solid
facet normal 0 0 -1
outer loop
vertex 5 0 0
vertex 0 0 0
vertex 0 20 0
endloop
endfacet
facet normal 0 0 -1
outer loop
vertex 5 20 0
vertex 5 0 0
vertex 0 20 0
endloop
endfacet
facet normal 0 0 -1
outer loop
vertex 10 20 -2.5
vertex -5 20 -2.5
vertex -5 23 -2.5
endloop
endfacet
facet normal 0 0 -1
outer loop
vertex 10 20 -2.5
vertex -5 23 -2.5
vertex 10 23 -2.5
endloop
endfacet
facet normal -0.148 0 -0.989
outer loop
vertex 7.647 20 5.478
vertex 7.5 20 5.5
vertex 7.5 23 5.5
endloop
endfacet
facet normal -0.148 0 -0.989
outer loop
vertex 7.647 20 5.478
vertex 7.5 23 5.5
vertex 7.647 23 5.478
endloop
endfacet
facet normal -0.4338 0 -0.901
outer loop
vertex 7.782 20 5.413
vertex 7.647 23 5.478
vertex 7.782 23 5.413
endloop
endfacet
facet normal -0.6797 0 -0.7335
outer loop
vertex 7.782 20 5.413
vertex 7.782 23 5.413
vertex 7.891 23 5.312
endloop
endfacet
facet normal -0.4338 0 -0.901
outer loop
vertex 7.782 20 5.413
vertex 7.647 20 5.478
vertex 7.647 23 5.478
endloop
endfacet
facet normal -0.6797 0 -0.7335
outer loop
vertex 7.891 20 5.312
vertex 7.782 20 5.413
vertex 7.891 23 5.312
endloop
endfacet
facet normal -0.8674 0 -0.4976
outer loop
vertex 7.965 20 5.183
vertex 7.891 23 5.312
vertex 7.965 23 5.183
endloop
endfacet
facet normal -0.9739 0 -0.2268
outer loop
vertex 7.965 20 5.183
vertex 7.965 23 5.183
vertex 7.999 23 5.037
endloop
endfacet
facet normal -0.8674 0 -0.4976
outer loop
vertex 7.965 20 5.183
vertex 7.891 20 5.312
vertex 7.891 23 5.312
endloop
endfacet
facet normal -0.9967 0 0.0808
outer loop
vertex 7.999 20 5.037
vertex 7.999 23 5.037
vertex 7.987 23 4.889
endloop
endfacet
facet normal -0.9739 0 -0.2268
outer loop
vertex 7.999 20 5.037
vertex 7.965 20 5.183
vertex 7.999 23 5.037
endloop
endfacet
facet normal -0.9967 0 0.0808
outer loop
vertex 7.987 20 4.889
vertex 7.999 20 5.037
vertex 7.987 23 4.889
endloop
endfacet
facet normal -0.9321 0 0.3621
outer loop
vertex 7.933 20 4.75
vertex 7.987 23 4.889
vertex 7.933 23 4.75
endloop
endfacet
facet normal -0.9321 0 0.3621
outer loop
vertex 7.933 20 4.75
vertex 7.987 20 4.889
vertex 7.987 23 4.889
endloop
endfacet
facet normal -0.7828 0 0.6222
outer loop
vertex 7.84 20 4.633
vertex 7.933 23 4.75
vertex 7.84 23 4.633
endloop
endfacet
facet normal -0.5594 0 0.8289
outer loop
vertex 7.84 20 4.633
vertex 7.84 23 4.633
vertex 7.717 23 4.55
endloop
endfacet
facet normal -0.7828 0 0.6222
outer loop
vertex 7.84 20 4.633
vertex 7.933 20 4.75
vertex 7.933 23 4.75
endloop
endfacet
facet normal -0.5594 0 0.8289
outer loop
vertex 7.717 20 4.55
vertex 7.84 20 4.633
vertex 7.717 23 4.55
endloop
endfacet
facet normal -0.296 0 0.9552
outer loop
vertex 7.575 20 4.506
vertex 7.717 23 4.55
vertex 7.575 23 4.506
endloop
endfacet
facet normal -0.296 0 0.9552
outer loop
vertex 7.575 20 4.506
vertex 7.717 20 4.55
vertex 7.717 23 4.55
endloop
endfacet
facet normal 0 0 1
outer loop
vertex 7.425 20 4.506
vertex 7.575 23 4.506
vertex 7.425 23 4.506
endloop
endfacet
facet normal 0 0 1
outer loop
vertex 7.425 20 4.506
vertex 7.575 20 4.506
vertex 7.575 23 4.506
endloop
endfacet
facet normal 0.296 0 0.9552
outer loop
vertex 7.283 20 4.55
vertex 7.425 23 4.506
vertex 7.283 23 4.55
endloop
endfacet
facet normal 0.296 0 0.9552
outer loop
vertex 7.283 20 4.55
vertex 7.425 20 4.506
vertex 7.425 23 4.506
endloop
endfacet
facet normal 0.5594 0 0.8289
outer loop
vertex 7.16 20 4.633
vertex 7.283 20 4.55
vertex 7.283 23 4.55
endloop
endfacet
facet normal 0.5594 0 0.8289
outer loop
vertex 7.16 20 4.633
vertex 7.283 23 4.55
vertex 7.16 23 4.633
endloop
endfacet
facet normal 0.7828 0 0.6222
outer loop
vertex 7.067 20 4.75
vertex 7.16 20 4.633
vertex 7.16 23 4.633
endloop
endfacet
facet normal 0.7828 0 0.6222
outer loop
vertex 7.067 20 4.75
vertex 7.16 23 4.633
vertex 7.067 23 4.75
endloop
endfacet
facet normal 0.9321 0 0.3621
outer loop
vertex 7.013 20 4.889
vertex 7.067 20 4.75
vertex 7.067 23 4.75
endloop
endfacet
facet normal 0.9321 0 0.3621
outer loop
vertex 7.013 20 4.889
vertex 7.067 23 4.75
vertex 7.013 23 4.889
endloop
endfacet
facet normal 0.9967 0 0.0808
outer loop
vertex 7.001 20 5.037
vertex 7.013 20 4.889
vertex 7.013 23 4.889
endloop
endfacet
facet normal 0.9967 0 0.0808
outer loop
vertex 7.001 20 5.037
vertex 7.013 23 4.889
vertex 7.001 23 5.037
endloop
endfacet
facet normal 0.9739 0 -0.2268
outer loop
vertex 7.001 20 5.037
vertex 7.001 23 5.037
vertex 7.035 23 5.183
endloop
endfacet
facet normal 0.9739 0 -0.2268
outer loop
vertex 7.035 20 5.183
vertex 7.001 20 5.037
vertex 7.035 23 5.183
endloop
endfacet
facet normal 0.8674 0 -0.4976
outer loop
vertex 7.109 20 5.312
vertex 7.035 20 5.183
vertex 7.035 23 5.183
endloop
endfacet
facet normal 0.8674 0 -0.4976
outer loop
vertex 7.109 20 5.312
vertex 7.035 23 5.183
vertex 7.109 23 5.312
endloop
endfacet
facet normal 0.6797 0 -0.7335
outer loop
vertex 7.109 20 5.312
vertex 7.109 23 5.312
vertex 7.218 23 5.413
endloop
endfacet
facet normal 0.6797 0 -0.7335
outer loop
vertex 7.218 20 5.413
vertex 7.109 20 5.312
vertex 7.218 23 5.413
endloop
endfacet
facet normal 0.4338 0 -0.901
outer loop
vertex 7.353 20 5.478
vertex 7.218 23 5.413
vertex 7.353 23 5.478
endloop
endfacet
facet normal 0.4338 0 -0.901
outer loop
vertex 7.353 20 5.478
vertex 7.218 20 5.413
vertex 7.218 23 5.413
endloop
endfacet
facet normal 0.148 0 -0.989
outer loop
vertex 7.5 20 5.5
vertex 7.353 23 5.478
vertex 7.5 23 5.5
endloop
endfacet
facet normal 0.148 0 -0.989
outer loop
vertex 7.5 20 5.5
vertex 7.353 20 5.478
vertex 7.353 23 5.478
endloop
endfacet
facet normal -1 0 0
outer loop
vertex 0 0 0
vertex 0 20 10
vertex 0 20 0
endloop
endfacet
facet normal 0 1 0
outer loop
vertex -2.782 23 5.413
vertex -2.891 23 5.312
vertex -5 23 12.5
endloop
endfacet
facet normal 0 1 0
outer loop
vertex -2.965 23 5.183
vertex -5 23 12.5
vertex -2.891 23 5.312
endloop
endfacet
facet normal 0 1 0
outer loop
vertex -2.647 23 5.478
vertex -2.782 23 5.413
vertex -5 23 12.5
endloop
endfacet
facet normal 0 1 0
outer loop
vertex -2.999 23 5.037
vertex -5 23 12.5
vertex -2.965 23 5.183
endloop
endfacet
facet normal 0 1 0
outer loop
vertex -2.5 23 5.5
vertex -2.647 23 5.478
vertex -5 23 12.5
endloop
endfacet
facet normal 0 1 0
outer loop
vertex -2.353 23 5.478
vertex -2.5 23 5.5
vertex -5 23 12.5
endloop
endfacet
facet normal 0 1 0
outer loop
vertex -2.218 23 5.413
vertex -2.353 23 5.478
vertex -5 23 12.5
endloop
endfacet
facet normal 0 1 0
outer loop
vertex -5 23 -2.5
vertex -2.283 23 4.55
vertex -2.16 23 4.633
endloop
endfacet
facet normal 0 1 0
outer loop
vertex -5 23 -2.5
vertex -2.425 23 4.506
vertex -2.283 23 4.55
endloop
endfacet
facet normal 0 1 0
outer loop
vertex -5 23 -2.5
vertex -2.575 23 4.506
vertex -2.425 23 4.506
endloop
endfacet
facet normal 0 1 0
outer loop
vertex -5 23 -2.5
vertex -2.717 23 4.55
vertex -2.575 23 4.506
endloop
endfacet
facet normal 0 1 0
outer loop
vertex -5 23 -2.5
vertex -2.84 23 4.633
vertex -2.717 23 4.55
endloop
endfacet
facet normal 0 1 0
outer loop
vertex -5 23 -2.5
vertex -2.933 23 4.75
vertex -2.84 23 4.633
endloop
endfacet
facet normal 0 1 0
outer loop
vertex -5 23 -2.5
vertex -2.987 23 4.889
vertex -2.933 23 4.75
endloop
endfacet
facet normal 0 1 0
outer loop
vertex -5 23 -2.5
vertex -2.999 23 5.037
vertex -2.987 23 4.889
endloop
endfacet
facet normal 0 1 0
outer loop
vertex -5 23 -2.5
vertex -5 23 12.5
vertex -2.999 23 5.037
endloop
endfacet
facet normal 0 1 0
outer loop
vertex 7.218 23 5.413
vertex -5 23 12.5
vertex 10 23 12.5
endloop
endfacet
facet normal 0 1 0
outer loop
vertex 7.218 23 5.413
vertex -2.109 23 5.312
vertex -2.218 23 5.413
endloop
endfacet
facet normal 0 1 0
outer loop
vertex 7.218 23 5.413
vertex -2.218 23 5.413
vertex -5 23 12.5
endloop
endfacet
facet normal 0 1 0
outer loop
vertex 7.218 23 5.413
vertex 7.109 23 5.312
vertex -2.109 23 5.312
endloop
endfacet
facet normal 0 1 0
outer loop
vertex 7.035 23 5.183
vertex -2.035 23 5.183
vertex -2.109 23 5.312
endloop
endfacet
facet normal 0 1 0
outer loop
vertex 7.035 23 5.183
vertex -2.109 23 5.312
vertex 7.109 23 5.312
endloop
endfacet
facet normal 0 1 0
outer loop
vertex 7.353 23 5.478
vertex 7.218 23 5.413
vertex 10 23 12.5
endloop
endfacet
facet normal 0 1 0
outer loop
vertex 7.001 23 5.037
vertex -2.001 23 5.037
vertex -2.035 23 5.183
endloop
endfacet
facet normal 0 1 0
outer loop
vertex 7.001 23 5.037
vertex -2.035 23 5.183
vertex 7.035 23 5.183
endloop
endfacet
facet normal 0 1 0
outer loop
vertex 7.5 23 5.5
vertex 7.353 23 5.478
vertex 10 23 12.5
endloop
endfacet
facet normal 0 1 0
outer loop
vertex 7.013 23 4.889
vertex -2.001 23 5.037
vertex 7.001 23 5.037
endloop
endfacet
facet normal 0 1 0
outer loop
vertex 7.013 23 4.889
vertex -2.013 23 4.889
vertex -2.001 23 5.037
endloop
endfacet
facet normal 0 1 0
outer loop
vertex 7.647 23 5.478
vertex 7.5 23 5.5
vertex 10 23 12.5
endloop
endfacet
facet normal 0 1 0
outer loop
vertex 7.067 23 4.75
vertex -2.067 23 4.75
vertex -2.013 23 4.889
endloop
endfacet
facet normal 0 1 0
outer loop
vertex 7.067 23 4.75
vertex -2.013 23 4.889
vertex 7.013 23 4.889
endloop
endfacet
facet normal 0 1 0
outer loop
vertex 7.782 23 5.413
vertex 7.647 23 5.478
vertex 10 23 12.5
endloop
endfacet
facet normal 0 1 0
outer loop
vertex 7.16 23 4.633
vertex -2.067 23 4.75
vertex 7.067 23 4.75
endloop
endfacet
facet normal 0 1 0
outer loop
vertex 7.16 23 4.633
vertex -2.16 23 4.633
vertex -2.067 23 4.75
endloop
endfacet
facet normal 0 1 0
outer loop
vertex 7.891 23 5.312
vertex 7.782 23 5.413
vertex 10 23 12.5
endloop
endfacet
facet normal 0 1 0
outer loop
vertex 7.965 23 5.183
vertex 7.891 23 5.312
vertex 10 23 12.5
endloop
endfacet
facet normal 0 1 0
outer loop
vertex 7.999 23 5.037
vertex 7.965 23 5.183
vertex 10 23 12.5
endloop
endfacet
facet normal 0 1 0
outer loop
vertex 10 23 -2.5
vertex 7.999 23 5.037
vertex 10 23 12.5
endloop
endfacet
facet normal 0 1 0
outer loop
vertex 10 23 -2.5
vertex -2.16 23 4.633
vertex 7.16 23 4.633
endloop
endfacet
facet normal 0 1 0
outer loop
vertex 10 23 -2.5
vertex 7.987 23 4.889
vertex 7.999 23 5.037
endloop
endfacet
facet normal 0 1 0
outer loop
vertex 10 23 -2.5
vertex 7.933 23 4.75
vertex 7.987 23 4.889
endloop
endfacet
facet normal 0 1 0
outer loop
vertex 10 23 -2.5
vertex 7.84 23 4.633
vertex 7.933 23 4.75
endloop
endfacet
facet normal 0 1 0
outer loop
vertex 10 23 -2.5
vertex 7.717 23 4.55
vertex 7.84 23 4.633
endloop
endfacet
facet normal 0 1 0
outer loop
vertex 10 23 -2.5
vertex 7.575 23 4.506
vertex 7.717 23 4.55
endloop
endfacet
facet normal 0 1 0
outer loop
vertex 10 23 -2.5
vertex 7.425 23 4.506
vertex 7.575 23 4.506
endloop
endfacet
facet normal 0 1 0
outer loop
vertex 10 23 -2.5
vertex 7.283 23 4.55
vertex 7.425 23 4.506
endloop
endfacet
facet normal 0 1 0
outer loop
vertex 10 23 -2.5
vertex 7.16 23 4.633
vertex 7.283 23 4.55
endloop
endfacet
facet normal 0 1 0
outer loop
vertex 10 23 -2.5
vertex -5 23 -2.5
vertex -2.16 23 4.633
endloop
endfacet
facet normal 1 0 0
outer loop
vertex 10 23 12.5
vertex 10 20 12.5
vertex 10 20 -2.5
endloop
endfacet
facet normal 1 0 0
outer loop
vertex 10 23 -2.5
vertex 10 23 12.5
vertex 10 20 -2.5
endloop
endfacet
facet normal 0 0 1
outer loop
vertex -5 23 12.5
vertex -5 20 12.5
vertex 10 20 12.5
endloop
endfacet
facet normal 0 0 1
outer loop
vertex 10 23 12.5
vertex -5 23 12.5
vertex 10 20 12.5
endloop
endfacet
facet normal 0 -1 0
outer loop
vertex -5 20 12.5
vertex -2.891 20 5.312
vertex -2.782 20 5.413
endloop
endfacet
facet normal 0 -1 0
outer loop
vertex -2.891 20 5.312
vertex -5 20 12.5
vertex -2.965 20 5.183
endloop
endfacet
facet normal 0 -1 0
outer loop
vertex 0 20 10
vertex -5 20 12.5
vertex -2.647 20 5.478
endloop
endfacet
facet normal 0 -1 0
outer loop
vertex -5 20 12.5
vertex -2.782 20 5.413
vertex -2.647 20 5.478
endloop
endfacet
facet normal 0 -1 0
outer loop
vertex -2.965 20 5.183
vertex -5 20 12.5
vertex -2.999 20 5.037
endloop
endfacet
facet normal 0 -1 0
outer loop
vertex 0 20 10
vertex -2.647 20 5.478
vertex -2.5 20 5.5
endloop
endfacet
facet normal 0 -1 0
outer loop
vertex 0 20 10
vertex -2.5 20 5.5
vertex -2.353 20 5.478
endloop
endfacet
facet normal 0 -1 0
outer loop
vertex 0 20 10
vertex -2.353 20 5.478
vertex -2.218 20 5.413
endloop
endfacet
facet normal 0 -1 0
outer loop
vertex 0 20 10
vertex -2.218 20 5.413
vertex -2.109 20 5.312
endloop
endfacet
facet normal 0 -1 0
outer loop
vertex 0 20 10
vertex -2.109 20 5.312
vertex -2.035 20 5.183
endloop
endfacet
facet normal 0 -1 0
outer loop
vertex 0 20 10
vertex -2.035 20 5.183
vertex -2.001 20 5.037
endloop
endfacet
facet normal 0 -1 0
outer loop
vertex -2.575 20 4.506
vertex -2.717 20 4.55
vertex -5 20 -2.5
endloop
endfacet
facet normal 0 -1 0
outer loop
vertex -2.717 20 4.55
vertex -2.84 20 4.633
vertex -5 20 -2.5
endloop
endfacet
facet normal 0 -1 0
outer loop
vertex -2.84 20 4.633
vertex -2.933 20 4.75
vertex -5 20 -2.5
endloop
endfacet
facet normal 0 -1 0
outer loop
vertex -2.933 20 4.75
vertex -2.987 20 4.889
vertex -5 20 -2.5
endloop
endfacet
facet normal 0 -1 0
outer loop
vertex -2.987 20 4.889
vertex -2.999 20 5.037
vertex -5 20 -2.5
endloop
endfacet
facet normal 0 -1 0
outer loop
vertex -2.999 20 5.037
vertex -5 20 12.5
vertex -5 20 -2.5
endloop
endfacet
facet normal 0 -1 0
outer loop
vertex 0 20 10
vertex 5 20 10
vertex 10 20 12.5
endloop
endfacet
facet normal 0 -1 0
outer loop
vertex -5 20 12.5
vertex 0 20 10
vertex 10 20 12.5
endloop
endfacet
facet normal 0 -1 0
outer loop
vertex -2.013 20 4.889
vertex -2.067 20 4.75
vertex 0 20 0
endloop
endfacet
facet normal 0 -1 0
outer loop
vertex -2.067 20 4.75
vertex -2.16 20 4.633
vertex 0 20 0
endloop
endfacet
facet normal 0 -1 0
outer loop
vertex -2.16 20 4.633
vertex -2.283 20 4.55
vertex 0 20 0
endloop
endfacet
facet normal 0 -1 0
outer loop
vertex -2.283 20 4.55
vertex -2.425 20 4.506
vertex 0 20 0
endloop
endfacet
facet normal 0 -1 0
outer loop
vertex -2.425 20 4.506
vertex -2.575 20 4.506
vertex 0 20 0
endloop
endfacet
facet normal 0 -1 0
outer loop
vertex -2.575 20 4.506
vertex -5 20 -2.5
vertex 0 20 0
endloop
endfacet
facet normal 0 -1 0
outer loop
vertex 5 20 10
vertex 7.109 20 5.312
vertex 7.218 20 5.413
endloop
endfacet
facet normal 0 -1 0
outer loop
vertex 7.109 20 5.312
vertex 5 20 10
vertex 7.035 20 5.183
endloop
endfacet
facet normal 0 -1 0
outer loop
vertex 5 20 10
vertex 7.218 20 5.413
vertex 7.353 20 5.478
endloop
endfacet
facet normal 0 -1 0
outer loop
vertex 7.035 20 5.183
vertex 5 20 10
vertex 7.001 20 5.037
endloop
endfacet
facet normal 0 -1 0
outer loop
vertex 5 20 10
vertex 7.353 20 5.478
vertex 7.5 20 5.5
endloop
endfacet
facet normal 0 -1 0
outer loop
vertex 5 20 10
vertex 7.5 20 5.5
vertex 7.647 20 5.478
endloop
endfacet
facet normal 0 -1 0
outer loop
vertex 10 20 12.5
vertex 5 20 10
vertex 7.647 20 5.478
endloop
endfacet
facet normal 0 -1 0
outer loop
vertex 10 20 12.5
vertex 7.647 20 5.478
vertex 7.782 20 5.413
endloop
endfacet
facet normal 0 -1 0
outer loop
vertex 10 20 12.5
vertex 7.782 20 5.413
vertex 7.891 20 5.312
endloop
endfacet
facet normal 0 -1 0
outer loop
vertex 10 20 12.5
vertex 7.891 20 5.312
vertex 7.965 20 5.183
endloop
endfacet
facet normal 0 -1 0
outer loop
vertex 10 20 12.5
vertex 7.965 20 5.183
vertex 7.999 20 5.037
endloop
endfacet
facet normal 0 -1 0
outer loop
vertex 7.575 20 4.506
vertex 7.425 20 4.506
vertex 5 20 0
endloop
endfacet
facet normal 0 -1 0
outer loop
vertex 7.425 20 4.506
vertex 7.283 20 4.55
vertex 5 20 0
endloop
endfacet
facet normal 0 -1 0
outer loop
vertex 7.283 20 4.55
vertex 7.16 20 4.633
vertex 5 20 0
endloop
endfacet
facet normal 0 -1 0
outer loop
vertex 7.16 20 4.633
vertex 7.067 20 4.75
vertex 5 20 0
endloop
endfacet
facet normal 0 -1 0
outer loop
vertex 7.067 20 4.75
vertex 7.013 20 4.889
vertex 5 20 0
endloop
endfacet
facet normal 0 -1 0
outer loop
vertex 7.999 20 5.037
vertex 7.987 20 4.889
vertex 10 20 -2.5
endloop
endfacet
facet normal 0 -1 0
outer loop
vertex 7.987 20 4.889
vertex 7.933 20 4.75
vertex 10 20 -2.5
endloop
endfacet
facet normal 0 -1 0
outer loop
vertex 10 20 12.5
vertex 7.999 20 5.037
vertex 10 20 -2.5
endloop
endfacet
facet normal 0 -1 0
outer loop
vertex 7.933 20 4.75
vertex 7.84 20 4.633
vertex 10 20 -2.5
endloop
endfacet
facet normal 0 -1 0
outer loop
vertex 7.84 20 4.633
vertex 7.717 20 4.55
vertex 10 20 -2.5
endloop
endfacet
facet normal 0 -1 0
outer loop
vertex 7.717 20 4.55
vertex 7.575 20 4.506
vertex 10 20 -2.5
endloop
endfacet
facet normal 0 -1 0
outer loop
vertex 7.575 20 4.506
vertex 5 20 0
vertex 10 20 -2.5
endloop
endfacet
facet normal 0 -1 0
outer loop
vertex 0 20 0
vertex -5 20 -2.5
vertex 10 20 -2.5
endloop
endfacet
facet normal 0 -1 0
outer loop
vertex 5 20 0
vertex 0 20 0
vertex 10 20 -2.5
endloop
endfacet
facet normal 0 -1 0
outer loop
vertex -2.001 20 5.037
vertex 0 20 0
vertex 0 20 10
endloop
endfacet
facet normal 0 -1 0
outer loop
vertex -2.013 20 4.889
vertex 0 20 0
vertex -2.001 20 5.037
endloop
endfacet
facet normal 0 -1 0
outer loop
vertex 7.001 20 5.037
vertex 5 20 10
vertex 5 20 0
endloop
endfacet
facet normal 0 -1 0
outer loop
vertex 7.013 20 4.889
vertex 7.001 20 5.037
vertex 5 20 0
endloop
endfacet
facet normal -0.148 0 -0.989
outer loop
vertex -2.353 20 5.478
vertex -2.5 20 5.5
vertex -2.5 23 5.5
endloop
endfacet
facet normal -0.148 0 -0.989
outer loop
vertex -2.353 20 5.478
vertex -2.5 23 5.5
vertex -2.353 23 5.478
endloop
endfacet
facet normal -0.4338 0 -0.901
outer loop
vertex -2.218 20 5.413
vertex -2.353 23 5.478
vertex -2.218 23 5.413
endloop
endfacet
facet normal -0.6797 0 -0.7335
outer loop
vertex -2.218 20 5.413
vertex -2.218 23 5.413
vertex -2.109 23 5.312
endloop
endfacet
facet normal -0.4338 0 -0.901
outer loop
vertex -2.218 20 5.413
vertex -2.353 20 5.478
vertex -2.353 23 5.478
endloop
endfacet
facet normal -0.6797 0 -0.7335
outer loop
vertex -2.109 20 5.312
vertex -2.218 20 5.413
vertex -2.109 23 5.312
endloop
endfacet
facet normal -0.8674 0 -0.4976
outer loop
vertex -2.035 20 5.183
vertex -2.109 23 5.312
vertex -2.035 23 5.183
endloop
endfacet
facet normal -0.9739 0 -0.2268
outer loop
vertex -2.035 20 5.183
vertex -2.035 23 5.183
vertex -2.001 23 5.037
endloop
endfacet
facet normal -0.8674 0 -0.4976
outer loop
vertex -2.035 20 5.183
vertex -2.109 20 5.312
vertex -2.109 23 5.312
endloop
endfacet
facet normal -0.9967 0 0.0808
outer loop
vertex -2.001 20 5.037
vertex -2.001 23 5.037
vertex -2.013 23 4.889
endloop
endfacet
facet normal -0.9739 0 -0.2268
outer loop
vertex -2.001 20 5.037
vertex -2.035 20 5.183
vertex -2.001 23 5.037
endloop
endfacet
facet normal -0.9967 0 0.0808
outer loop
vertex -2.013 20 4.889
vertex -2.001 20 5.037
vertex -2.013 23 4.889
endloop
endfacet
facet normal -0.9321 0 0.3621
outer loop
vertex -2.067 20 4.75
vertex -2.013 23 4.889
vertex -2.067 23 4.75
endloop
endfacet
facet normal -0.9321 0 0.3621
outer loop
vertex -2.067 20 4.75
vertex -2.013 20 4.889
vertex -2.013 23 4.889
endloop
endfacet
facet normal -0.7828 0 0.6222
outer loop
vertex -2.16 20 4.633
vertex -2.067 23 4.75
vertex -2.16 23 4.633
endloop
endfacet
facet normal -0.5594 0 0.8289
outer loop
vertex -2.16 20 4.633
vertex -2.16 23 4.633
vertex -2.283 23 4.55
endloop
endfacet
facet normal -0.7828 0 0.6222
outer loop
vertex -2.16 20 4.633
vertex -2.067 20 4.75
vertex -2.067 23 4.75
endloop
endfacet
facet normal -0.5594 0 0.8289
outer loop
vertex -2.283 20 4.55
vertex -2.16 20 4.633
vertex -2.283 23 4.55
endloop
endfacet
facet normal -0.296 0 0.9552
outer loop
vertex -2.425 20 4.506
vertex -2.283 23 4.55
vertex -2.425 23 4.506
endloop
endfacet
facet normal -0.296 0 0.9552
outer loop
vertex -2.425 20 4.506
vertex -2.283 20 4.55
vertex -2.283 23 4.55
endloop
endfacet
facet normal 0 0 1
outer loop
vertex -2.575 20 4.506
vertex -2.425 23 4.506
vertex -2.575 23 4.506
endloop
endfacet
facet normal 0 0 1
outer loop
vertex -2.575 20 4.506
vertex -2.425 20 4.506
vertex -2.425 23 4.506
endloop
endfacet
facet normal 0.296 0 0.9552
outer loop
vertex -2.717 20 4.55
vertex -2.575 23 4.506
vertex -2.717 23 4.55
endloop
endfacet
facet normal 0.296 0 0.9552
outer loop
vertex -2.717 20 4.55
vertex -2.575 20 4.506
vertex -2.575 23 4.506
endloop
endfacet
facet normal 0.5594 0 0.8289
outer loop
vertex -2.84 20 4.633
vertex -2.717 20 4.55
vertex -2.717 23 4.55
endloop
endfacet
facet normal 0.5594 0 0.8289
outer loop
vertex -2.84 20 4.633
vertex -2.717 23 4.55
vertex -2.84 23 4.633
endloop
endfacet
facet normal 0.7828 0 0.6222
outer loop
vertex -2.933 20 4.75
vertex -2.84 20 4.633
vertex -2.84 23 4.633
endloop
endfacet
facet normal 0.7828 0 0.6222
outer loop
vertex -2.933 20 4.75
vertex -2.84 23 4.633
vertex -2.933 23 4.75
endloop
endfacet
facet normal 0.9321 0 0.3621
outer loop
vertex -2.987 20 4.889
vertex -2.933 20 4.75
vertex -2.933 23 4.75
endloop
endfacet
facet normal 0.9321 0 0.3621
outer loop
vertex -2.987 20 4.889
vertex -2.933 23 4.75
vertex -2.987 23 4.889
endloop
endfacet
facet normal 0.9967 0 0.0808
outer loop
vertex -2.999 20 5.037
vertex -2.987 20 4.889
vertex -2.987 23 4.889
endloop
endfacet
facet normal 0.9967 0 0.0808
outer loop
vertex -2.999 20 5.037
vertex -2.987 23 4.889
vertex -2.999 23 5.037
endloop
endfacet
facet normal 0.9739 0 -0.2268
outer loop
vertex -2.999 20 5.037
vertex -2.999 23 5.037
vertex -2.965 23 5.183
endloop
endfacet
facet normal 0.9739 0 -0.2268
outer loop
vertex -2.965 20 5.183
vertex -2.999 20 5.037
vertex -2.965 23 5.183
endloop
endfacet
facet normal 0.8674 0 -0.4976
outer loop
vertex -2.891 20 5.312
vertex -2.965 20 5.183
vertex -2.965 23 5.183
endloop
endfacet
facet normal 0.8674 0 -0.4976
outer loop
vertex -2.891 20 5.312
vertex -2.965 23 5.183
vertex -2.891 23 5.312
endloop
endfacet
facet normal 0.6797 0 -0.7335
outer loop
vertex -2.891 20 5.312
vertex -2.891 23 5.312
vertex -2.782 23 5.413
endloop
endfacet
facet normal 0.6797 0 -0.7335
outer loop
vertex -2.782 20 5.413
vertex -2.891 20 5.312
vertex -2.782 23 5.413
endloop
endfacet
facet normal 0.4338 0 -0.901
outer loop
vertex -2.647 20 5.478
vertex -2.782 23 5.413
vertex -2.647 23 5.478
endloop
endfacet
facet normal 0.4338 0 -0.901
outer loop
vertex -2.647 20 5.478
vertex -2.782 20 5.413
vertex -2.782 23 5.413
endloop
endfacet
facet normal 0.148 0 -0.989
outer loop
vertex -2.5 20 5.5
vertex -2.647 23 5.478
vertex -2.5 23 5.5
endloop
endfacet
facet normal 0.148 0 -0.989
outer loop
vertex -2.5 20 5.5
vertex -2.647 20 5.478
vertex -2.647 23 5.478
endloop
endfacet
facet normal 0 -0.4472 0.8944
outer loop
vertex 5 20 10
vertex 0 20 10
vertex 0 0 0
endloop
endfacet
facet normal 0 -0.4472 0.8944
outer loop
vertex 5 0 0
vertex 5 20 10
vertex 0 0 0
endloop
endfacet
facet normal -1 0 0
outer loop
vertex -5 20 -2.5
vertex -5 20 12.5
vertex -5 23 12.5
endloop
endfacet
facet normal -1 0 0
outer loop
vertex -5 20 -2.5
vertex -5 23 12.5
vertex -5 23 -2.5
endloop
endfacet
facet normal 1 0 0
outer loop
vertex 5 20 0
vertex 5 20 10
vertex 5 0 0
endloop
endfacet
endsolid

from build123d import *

# Parameters (mm, degrees)
EXTRUDE_1_DEPTH = 5
SKETCH_2_W      = 15
SKETCH_2_H      = 15
SKETCH_2_R      = 0.5
EXTRUDE_2_DEPTH = 3


with BuildPart() as part:
    # Эскиз1 → Бобышка-Вытянуть1 (new body)
    with BuildSketch(Plane(origin=(0, 0, 0), x_dir=(0, 0, -1), z_dir=(1, 0, 0))):
        Polygon((-10, 20), (0, 0), (0, 20), align=None)
    extrude(amount=EXTRUDE_1_DEPTH)

    # Эскиз2 → Бобышка-Вытянуть2 (add)
    with BuildSketch(Plane(origin=(0, 20, 0), x_dir=(1, 0, 0), z_dir=(0, 1, 0))):
        with Locations((2.5, -5)):
            Rectangle(SKETCH_2_W, SKETCH_2_H)
        with Locations(Location((-2.5, -5, 0), (0, 0, 270))):
            Circle(SKETCH_2_R, mode=Mode.SUBTRACT)
        with Locations(Location((7.5, -5, 0), (0, 0, 270))):
            Circle(SKETCH_2_R, mode=Mode.SUBTRACT)
    extrude(amount=EXTRUDE_2_DEPTH)


solid = part.part
